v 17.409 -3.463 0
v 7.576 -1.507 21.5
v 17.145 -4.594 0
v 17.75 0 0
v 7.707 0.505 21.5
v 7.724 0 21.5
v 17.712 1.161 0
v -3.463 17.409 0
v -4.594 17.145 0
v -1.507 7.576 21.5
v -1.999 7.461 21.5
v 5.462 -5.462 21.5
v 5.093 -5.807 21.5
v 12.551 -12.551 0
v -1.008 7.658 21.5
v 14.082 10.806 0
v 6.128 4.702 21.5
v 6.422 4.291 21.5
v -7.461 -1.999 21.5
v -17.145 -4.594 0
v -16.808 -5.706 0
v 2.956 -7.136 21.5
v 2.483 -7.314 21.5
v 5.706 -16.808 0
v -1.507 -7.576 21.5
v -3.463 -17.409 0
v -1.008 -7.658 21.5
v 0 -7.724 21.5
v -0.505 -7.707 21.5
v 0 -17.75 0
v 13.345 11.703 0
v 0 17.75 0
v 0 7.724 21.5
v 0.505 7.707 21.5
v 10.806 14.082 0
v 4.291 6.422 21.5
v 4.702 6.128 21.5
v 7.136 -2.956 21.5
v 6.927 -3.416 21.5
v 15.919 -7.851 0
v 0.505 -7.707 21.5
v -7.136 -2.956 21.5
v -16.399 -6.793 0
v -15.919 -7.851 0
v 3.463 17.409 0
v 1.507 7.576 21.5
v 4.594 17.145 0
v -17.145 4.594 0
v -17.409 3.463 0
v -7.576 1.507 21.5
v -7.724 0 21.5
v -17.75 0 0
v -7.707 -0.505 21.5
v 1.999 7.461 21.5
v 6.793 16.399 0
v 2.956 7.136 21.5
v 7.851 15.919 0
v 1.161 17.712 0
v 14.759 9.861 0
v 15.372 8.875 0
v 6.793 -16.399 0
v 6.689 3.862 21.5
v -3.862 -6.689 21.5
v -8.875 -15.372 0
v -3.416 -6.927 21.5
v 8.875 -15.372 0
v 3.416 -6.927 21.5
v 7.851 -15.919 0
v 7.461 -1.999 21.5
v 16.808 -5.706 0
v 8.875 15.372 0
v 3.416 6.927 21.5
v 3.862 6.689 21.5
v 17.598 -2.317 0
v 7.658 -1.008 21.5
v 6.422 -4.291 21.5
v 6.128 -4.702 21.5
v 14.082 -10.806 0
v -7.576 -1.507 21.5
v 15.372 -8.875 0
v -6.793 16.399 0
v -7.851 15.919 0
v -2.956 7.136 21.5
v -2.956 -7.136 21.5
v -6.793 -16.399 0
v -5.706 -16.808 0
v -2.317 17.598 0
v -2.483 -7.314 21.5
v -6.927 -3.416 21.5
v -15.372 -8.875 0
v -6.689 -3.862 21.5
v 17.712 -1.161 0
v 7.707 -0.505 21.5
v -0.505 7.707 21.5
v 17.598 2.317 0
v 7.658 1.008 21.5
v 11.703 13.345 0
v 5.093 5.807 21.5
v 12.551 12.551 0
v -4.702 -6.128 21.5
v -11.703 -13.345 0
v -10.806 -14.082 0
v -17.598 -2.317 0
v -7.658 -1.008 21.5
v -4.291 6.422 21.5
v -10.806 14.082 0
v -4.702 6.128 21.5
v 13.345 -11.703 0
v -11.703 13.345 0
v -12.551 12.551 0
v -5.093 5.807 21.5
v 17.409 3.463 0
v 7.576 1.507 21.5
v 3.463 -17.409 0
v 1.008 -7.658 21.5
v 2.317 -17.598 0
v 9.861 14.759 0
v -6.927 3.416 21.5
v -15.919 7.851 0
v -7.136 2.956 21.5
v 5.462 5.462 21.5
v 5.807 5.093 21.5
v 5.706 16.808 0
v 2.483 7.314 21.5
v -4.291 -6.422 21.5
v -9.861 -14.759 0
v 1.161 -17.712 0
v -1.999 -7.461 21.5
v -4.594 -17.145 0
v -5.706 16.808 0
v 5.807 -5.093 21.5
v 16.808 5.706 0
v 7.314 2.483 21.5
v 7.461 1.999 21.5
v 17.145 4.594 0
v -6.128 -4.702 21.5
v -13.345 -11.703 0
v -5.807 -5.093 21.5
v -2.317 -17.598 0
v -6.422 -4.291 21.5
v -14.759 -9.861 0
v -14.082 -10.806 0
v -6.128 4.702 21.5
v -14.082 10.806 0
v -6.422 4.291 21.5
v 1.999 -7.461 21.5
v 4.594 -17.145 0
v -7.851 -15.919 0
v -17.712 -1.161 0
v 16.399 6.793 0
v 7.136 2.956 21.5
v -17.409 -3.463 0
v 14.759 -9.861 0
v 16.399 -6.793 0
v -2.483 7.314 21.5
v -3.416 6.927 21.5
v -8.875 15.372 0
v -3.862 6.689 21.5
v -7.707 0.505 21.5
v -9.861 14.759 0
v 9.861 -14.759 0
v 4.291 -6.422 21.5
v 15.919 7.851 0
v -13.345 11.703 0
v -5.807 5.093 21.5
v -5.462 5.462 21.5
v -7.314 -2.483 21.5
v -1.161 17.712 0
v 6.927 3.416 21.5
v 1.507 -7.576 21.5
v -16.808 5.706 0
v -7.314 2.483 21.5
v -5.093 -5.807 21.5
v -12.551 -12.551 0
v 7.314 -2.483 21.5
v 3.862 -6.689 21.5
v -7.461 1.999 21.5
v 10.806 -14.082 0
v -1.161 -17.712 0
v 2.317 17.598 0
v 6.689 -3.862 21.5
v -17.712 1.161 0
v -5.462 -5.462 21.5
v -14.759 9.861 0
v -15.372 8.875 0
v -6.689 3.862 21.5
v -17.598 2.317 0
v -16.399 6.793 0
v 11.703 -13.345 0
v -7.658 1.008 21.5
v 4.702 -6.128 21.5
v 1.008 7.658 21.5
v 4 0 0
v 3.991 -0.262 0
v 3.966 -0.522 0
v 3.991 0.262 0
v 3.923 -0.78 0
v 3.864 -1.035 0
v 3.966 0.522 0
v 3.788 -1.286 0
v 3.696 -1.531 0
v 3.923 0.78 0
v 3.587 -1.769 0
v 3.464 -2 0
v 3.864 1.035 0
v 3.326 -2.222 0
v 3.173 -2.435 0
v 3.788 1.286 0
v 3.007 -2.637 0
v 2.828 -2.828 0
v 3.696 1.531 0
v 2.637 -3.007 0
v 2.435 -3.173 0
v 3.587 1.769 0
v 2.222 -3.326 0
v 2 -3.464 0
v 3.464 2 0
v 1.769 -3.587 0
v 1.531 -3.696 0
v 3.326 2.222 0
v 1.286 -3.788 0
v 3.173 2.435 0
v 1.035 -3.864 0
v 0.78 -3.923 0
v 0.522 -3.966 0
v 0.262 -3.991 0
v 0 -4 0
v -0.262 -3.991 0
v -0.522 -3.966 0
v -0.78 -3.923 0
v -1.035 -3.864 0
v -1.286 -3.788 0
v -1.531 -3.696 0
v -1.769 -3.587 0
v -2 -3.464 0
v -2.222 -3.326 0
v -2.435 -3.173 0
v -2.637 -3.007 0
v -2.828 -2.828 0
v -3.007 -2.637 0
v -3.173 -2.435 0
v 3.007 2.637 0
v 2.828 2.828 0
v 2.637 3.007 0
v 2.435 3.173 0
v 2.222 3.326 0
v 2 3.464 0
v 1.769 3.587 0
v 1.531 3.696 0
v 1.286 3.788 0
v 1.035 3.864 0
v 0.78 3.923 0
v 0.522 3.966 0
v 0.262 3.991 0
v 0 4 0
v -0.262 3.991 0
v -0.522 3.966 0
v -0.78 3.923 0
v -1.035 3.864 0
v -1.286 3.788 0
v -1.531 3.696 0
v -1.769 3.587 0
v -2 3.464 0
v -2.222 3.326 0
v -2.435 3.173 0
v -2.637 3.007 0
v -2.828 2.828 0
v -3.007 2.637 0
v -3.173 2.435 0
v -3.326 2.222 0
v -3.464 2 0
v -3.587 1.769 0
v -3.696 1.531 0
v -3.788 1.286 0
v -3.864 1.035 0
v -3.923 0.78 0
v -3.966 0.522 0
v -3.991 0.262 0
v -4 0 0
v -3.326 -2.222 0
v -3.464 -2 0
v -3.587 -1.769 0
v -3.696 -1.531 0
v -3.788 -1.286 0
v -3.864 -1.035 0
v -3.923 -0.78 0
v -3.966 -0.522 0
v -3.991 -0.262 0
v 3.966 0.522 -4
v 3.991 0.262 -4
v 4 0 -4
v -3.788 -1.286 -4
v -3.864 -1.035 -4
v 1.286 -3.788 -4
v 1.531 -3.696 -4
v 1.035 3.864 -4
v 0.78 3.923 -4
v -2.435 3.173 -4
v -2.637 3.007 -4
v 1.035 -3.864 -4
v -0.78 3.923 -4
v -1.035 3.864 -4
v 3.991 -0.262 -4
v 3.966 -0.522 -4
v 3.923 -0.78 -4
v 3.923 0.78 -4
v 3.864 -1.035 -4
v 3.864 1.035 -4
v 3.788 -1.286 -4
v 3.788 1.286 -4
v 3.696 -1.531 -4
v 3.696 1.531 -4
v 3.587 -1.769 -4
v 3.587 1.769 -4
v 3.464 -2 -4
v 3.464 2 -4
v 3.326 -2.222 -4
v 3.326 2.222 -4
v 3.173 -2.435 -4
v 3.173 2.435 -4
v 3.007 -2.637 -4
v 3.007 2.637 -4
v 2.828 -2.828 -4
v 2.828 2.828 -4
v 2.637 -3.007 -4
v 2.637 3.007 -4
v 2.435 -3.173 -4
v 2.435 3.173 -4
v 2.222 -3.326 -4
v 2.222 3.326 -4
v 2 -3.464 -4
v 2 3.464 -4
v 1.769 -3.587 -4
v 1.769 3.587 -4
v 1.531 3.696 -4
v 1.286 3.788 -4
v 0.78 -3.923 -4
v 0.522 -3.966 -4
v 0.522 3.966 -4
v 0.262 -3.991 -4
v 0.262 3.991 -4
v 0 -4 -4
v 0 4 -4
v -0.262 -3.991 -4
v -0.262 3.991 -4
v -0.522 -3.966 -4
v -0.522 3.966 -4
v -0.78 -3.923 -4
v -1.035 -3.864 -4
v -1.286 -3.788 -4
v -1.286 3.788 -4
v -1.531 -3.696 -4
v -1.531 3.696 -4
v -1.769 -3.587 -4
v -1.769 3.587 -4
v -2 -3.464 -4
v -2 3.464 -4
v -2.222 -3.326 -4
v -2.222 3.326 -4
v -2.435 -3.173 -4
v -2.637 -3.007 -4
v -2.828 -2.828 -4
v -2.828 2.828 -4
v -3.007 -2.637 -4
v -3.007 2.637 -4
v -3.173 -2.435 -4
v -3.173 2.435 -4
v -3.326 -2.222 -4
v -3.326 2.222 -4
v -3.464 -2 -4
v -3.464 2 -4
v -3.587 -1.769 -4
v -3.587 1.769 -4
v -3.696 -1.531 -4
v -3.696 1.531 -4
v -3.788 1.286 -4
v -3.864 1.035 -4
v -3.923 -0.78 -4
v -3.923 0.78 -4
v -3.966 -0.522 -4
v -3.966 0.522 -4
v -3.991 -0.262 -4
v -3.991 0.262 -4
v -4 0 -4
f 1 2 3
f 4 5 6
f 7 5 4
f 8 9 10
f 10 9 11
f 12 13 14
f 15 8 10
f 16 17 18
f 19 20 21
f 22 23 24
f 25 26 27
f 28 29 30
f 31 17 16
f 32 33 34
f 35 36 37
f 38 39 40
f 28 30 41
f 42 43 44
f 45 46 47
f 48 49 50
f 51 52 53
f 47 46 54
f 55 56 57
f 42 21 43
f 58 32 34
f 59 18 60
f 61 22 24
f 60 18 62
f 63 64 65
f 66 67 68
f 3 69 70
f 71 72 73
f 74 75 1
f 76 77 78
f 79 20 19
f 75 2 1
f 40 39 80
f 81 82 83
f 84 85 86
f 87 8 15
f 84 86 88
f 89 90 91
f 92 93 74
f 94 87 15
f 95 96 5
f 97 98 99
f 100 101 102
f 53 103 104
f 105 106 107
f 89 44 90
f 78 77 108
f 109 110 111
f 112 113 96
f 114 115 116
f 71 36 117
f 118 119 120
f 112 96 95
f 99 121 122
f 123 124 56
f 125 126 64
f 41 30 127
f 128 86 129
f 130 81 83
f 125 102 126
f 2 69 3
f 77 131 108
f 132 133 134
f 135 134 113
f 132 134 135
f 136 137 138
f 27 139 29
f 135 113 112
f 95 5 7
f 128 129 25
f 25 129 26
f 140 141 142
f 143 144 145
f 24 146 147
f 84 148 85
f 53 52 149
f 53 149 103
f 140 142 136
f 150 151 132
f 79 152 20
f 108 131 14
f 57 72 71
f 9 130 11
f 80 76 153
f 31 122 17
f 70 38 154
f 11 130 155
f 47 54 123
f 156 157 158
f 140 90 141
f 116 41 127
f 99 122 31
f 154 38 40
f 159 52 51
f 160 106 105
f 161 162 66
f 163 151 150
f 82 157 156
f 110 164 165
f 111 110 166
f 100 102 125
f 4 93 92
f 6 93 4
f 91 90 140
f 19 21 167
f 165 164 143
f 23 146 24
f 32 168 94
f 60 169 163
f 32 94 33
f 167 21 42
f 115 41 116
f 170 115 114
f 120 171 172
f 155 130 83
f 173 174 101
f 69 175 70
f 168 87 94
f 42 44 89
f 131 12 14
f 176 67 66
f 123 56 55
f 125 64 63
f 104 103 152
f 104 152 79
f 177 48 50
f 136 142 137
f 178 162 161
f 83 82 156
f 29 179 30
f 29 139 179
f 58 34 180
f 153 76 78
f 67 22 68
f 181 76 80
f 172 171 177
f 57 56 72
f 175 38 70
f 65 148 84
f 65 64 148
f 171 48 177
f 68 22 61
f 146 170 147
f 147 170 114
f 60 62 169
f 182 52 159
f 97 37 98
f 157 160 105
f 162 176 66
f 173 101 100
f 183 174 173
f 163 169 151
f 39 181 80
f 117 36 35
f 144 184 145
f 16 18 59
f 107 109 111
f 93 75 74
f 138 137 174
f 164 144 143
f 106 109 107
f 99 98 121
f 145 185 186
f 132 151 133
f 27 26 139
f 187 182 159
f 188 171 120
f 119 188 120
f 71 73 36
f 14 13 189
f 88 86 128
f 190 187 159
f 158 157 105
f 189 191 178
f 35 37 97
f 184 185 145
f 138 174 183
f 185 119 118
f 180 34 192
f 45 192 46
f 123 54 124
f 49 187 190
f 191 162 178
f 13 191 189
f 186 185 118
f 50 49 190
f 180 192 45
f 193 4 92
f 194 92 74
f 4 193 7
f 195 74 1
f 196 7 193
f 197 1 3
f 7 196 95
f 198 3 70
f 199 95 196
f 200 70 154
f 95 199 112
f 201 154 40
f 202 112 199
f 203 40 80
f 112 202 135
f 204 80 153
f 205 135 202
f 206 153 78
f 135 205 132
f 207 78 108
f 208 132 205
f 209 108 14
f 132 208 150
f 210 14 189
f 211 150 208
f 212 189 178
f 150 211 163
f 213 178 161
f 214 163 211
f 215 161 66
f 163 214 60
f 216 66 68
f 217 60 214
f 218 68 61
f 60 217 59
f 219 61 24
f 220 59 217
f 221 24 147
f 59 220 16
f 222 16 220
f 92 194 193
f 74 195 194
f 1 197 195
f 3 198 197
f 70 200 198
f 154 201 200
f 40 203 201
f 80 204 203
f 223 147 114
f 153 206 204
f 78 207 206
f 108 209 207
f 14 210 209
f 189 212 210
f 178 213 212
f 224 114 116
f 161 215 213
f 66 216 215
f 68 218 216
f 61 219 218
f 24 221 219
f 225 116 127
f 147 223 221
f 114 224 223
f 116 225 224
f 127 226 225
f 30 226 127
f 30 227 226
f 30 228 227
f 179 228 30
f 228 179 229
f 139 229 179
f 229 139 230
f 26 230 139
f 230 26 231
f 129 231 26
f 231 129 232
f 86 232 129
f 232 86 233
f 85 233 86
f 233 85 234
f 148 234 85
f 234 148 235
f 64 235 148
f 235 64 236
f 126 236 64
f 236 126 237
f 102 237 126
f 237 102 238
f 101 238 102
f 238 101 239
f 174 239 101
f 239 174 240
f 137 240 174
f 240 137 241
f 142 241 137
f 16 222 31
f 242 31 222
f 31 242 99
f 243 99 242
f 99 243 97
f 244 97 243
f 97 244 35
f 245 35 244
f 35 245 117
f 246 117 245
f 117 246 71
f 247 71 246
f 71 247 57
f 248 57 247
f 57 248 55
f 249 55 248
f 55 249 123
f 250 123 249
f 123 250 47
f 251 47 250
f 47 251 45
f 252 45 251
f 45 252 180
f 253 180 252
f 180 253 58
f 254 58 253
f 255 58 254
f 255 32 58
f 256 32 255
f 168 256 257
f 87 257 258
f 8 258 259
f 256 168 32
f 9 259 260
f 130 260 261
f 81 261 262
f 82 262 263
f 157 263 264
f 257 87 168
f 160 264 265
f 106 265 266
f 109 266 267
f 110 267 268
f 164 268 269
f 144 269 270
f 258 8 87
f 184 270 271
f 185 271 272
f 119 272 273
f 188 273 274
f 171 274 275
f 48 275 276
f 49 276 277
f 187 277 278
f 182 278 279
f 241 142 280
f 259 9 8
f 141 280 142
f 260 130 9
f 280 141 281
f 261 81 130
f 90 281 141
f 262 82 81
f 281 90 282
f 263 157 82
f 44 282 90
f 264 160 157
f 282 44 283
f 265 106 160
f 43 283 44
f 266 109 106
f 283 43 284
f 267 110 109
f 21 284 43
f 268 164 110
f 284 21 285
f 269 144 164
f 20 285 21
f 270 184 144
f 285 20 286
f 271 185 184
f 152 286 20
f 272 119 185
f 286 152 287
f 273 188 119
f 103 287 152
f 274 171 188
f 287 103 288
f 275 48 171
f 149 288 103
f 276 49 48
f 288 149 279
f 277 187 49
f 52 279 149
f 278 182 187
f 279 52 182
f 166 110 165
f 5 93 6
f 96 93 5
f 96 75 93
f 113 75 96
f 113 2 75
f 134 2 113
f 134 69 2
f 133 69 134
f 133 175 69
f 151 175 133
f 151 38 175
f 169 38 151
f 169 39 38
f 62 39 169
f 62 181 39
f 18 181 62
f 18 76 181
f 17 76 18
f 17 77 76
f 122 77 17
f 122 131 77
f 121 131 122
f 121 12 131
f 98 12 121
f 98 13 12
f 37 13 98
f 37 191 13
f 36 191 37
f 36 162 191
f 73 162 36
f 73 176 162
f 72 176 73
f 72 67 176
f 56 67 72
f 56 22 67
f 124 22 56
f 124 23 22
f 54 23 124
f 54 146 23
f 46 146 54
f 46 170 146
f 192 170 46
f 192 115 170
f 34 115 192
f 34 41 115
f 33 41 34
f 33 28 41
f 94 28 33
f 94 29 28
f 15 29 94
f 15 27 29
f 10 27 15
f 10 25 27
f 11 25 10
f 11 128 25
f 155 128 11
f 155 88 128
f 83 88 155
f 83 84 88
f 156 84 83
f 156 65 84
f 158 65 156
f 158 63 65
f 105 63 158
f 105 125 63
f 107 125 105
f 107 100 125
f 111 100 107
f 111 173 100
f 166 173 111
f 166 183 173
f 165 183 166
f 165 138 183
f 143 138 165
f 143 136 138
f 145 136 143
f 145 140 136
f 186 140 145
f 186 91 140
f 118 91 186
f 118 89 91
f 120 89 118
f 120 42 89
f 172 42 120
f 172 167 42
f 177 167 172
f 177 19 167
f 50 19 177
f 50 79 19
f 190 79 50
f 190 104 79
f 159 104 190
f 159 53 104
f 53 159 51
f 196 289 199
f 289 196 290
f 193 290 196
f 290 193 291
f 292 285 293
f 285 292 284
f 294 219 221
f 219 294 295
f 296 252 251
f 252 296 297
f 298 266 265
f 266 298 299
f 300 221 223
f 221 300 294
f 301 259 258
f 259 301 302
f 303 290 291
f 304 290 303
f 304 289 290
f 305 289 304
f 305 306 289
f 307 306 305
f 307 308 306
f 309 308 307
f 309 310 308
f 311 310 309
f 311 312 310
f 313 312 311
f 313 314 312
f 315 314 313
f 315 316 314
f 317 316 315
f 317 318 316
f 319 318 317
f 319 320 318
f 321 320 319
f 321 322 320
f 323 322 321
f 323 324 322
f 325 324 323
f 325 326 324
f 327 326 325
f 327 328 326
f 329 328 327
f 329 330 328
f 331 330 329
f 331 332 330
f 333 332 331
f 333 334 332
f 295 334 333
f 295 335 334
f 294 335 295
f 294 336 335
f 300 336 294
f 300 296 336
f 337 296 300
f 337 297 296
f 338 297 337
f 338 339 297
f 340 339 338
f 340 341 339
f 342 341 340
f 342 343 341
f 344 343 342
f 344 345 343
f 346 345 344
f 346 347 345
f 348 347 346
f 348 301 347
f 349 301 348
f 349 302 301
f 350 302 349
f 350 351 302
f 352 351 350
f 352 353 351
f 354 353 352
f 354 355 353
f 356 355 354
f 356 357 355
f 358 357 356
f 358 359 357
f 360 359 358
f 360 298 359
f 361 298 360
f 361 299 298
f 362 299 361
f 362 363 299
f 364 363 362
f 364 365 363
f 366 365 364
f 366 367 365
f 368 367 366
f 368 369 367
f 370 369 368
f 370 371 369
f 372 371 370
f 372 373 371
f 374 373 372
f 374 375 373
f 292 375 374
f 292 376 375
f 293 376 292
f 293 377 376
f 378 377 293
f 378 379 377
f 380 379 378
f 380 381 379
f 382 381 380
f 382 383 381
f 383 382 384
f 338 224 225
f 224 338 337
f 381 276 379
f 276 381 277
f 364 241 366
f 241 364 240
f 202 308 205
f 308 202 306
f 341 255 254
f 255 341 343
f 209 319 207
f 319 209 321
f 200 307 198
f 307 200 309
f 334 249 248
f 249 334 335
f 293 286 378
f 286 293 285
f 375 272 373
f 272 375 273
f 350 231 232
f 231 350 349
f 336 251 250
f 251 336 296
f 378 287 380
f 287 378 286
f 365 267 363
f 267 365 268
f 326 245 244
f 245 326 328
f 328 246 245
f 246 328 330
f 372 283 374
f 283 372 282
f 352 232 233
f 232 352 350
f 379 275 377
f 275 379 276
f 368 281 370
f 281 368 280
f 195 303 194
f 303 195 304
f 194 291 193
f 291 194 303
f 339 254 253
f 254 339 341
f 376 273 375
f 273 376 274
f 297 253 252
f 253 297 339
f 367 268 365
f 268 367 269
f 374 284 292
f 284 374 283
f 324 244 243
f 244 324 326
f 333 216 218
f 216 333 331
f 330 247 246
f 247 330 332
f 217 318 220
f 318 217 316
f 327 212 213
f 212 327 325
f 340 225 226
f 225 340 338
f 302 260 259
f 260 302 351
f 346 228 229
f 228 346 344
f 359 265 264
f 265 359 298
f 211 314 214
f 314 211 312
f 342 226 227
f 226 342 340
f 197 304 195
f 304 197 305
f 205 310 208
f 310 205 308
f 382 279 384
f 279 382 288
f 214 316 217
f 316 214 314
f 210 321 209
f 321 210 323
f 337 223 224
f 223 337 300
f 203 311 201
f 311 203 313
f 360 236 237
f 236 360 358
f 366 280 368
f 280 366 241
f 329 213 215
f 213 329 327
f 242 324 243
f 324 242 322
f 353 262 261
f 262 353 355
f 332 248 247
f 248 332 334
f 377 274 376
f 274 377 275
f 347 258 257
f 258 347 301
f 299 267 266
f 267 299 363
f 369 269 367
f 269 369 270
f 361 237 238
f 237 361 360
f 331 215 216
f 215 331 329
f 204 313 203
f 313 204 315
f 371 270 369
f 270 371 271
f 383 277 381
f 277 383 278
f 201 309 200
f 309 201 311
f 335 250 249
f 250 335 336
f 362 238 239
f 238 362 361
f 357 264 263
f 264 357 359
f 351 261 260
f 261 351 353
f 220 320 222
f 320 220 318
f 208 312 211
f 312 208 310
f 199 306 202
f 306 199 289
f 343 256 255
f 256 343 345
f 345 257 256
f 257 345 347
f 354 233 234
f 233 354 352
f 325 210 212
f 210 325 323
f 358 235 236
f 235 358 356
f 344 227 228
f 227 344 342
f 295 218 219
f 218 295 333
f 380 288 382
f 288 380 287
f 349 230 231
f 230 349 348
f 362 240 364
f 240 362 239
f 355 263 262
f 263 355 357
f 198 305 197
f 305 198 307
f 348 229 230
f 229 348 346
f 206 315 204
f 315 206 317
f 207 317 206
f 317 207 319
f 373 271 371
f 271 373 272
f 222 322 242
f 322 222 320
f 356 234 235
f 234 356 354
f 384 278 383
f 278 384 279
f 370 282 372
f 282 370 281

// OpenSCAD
// Locating cone of the ARES_Mauer floor guides - generated by tools/make_guides.py from config/station.toml
// [guides] (edit the config and regenerate rather than this file). Use orientation: base on the MDF strip,
// peg down into the peg hole; PRINT upside down (narrow top on the bed, peg up). Units mm.
$fn = 96;
H = 21.500;          // [guides] locator_h
R_BASE = 17.750;    // socket cone at the stone's underside - clearance
R_TOP = 7.724;     // the same cone at H
PEG_D = 8.000;
PEG_LEN = 4.000;

cylinder(h = H, r1 = R_BASE, r2 = R_TOP);
translate([0, 0, -PEG_LEN]) cylinder(h = PEG_LEN + 0.5, d = PEG_D);
